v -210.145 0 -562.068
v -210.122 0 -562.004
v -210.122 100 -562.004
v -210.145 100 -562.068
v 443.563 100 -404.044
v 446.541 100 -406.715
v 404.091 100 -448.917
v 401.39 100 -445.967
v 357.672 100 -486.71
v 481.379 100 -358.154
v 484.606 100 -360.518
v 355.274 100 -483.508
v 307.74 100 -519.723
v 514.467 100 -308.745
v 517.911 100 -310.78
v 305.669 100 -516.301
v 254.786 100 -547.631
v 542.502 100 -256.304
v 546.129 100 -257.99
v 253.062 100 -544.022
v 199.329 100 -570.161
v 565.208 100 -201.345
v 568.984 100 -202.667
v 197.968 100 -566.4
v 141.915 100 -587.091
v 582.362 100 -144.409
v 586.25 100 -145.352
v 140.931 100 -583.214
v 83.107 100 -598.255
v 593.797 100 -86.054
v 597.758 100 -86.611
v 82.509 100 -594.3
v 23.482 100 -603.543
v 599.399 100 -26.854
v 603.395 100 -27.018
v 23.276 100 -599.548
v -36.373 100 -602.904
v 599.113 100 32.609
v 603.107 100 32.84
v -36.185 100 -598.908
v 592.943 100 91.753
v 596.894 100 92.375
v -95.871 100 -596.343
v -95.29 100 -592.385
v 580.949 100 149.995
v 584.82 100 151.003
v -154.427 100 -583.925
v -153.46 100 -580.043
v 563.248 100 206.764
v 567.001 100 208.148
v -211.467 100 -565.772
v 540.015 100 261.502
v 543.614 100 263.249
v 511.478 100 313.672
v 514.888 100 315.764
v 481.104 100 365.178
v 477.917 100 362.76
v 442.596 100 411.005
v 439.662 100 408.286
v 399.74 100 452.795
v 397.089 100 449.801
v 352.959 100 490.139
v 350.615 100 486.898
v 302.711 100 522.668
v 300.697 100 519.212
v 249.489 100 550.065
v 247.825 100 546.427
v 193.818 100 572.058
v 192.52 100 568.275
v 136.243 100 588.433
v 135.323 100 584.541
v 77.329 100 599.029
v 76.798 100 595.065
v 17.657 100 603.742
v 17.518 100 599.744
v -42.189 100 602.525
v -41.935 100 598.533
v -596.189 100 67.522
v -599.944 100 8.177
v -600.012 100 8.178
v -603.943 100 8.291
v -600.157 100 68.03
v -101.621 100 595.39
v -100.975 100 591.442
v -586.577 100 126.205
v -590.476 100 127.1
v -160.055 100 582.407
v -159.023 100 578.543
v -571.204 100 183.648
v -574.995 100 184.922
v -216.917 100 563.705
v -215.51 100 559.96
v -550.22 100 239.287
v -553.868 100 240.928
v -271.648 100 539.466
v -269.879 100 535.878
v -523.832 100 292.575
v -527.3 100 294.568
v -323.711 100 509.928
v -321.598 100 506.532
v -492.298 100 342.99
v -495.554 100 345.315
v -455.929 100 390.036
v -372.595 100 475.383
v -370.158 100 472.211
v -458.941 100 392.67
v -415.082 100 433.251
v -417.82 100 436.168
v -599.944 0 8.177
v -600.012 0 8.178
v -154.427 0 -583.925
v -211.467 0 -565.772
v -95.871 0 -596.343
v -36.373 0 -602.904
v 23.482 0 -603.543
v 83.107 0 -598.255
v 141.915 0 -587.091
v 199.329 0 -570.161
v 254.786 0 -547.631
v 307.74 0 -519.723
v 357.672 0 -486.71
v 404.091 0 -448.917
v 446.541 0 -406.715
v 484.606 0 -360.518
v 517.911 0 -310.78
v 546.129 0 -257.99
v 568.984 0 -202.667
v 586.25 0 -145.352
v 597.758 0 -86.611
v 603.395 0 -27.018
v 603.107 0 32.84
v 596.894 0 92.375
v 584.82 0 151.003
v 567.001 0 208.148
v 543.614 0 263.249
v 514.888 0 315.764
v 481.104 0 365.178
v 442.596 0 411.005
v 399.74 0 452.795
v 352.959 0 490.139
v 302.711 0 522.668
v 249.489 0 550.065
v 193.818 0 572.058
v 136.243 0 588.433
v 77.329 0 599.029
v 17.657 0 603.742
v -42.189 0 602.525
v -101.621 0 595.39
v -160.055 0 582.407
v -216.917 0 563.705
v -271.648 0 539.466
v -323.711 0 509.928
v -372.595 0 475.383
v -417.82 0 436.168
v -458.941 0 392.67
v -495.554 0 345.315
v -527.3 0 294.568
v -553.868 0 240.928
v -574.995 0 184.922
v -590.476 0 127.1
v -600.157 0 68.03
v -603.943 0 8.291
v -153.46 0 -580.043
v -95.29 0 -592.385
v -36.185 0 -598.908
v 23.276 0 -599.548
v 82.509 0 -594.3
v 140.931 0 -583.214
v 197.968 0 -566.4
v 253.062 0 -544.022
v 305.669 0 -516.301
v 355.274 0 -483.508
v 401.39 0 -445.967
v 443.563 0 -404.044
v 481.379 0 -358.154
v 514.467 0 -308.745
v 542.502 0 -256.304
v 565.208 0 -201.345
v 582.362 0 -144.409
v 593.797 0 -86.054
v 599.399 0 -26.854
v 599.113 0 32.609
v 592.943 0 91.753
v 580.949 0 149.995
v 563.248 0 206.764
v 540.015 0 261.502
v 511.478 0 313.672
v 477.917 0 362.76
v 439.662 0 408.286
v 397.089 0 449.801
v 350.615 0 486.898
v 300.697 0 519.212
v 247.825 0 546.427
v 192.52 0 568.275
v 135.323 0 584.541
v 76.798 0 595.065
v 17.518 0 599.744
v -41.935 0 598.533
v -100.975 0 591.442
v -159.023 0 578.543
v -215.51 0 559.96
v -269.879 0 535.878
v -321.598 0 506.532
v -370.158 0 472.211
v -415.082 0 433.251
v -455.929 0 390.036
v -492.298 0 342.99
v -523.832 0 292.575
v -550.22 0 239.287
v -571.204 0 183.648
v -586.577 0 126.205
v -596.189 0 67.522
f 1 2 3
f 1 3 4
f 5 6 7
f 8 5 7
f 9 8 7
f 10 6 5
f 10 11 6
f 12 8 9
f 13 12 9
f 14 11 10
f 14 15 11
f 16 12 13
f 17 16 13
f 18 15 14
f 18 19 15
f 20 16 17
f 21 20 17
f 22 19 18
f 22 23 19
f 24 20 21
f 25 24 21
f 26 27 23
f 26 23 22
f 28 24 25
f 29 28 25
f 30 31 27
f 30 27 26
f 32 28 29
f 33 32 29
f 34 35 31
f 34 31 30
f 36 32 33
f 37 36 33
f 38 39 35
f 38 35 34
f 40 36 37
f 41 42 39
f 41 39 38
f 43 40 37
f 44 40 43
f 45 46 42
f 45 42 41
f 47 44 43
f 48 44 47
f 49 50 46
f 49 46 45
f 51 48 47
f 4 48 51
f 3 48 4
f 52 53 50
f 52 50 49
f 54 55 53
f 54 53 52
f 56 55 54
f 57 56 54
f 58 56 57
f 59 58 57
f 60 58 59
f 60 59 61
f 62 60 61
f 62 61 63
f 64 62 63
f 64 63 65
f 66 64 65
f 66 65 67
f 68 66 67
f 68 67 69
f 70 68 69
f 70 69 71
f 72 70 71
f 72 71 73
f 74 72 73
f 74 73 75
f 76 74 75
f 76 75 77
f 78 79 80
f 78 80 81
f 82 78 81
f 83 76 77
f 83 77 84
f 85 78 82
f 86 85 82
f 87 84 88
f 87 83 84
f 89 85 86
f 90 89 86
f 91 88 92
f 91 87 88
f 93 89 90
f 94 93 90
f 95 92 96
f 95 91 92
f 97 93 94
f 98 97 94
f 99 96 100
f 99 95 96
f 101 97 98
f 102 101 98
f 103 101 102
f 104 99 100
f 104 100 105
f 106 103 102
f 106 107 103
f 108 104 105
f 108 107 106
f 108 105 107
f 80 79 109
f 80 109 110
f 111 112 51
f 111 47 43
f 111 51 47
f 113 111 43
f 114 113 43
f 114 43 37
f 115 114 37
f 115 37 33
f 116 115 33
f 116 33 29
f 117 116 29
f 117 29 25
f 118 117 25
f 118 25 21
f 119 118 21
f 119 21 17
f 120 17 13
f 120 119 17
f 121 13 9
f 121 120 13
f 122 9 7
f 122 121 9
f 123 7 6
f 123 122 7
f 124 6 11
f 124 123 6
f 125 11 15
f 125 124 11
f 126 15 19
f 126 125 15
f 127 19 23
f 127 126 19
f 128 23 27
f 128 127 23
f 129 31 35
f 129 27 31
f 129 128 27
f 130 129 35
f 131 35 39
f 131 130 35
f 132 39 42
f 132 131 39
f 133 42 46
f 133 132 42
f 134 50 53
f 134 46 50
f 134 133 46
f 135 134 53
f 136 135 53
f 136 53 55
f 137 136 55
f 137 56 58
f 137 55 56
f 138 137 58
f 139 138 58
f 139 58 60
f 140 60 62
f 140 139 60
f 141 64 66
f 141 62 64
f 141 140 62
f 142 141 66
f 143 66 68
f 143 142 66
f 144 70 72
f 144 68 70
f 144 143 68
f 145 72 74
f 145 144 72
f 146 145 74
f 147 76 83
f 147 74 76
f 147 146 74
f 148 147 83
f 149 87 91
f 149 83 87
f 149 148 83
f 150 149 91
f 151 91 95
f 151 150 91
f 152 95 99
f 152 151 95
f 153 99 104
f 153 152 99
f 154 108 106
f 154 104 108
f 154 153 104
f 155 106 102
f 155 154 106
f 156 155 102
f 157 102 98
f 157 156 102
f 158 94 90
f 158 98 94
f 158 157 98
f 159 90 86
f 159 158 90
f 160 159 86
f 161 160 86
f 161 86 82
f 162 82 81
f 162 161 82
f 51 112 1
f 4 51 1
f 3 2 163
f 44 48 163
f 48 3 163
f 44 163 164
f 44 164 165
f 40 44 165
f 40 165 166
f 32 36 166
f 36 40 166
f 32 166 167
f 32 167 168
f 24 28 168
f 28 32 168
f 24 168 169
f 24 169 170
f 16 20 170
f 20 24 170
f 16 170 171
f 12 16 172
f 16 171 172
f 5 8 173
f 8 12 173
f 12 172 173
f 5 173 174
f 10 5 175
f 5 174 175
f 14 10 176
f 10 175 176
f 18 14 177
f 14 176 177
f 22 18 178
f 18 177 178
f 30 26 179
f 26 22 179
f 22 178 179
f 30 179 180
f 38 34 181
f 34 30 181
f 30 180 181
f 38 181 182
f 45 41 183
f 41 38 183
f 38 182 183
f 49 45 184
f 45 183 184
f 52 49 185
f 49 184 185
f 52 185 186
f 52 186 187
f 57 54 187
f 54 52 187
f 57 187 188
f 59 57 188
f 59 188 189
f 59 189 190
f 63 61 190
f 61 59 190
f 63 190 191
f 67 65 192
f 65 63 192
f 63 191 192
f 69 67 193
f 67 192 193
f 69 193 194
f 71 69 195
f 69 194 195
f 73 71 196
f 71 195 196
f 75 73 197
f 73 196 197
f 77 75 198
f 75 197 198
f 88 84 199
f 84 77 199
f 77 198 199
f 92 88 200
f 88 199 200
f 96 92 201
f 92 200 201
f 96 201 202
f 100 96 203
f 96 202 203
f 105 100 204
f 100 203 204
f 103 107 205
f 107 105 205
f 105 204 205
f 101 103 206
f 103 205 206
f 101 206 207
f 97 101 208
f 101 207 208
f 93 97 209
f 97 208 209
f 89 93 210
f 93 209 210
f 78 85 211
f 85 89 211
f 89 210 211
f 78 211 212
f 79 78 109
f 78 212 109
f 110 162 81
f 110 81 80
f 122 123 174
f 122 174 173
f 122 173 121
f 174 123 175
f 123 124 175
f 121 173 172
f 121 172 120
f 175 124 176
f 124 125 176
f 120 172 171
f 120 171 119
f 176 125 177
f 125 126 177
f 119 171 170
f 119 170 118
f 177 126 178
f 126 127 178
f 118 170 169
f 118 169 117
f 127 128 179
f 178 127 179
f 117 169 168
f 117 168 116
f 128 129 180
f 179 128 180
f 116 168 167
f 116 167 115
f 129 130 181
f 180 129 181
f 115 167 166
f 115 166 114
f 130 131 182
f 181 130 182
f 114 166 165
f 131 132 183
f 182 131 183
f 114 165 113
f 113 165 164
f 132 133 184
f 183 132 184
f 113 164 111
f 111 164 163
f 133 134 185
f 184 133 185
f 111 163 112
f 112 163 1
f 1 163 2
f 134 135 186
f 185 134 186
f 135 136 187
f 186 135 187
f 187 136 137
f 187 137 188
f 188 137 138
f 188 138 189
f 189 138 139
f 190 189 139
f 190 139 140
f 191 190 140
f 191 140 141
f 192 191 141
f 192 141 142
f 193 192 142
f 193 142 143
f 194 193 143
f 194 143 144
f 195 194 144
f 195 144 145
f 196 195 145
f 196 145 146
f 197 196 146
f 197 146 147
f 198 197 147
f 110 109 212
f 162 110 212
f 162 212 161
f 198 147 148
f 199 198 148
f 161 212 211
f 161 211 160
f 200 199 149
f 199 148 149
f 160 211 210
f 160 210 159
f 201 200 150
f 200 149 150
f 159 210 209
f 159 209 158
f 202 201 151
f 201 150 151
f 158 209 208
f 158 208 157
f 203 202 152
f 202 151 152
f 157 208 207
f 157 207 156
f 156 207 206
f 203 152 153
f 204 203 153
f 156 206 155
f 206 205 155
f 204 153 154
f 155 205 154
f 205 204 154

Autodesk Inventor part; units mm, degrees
ref_plane "YZ Plane" through (0, 0, 0) normal (1, 0, 0) x (0, 1, 0)
ref_plane "XZ Plane" through (0, 0, 0) normal (0, 1, 0) x (-1, 0, 0)
ref_plane "XY Plane" through (0, 0, 0) normal (0, 0, 1) x (1, 0, 0)
sketch "Sketch1" plane through (0, 0, 0) normal (0, 1, 0) x (-1, 0, 0)
  circle A0 centre (0, 0) radius 600
  circle A1 centre (0, 0) radius 604
  dimension "d0" = 1200
  dimension "d1" = 1208
extrude "Extrusion1" add sketch "Sketch1" along normal blind 100
sketch "Sketch2" plane through (0, 0, 0) normal (0, -1, 0) x (1, 0, 0)
  line L0 (-737.5363, 12.1167) -> (-600.0118, 8.1785) projected
  line L1 (-256.3877, -691.6444) -> (-210.1448, -562.0678) projected
  circle A0 centre (0, 0) radius 600 projected
  line L2 (-210.1221, -562.0042) -> (-211.4667, -565.7719)
  circle A1 centre (0, 0) radius 604 projected
  line L3 (-599.9441, 8.1765) -> (-603.943, 8.2911)
  point P0 (-599.9443, 8.1765)
  point P1 (-603.9431, 8.2911)
extrude "Extrusion2" cut sketch "Sketch2" against normal blind 100 contours L0 L3 A0 L2 L1 A1 picked at (-484.3692, -358.2492)
properties part number "Edge Band - Platform A Outer" material "Wood (Birch)"
